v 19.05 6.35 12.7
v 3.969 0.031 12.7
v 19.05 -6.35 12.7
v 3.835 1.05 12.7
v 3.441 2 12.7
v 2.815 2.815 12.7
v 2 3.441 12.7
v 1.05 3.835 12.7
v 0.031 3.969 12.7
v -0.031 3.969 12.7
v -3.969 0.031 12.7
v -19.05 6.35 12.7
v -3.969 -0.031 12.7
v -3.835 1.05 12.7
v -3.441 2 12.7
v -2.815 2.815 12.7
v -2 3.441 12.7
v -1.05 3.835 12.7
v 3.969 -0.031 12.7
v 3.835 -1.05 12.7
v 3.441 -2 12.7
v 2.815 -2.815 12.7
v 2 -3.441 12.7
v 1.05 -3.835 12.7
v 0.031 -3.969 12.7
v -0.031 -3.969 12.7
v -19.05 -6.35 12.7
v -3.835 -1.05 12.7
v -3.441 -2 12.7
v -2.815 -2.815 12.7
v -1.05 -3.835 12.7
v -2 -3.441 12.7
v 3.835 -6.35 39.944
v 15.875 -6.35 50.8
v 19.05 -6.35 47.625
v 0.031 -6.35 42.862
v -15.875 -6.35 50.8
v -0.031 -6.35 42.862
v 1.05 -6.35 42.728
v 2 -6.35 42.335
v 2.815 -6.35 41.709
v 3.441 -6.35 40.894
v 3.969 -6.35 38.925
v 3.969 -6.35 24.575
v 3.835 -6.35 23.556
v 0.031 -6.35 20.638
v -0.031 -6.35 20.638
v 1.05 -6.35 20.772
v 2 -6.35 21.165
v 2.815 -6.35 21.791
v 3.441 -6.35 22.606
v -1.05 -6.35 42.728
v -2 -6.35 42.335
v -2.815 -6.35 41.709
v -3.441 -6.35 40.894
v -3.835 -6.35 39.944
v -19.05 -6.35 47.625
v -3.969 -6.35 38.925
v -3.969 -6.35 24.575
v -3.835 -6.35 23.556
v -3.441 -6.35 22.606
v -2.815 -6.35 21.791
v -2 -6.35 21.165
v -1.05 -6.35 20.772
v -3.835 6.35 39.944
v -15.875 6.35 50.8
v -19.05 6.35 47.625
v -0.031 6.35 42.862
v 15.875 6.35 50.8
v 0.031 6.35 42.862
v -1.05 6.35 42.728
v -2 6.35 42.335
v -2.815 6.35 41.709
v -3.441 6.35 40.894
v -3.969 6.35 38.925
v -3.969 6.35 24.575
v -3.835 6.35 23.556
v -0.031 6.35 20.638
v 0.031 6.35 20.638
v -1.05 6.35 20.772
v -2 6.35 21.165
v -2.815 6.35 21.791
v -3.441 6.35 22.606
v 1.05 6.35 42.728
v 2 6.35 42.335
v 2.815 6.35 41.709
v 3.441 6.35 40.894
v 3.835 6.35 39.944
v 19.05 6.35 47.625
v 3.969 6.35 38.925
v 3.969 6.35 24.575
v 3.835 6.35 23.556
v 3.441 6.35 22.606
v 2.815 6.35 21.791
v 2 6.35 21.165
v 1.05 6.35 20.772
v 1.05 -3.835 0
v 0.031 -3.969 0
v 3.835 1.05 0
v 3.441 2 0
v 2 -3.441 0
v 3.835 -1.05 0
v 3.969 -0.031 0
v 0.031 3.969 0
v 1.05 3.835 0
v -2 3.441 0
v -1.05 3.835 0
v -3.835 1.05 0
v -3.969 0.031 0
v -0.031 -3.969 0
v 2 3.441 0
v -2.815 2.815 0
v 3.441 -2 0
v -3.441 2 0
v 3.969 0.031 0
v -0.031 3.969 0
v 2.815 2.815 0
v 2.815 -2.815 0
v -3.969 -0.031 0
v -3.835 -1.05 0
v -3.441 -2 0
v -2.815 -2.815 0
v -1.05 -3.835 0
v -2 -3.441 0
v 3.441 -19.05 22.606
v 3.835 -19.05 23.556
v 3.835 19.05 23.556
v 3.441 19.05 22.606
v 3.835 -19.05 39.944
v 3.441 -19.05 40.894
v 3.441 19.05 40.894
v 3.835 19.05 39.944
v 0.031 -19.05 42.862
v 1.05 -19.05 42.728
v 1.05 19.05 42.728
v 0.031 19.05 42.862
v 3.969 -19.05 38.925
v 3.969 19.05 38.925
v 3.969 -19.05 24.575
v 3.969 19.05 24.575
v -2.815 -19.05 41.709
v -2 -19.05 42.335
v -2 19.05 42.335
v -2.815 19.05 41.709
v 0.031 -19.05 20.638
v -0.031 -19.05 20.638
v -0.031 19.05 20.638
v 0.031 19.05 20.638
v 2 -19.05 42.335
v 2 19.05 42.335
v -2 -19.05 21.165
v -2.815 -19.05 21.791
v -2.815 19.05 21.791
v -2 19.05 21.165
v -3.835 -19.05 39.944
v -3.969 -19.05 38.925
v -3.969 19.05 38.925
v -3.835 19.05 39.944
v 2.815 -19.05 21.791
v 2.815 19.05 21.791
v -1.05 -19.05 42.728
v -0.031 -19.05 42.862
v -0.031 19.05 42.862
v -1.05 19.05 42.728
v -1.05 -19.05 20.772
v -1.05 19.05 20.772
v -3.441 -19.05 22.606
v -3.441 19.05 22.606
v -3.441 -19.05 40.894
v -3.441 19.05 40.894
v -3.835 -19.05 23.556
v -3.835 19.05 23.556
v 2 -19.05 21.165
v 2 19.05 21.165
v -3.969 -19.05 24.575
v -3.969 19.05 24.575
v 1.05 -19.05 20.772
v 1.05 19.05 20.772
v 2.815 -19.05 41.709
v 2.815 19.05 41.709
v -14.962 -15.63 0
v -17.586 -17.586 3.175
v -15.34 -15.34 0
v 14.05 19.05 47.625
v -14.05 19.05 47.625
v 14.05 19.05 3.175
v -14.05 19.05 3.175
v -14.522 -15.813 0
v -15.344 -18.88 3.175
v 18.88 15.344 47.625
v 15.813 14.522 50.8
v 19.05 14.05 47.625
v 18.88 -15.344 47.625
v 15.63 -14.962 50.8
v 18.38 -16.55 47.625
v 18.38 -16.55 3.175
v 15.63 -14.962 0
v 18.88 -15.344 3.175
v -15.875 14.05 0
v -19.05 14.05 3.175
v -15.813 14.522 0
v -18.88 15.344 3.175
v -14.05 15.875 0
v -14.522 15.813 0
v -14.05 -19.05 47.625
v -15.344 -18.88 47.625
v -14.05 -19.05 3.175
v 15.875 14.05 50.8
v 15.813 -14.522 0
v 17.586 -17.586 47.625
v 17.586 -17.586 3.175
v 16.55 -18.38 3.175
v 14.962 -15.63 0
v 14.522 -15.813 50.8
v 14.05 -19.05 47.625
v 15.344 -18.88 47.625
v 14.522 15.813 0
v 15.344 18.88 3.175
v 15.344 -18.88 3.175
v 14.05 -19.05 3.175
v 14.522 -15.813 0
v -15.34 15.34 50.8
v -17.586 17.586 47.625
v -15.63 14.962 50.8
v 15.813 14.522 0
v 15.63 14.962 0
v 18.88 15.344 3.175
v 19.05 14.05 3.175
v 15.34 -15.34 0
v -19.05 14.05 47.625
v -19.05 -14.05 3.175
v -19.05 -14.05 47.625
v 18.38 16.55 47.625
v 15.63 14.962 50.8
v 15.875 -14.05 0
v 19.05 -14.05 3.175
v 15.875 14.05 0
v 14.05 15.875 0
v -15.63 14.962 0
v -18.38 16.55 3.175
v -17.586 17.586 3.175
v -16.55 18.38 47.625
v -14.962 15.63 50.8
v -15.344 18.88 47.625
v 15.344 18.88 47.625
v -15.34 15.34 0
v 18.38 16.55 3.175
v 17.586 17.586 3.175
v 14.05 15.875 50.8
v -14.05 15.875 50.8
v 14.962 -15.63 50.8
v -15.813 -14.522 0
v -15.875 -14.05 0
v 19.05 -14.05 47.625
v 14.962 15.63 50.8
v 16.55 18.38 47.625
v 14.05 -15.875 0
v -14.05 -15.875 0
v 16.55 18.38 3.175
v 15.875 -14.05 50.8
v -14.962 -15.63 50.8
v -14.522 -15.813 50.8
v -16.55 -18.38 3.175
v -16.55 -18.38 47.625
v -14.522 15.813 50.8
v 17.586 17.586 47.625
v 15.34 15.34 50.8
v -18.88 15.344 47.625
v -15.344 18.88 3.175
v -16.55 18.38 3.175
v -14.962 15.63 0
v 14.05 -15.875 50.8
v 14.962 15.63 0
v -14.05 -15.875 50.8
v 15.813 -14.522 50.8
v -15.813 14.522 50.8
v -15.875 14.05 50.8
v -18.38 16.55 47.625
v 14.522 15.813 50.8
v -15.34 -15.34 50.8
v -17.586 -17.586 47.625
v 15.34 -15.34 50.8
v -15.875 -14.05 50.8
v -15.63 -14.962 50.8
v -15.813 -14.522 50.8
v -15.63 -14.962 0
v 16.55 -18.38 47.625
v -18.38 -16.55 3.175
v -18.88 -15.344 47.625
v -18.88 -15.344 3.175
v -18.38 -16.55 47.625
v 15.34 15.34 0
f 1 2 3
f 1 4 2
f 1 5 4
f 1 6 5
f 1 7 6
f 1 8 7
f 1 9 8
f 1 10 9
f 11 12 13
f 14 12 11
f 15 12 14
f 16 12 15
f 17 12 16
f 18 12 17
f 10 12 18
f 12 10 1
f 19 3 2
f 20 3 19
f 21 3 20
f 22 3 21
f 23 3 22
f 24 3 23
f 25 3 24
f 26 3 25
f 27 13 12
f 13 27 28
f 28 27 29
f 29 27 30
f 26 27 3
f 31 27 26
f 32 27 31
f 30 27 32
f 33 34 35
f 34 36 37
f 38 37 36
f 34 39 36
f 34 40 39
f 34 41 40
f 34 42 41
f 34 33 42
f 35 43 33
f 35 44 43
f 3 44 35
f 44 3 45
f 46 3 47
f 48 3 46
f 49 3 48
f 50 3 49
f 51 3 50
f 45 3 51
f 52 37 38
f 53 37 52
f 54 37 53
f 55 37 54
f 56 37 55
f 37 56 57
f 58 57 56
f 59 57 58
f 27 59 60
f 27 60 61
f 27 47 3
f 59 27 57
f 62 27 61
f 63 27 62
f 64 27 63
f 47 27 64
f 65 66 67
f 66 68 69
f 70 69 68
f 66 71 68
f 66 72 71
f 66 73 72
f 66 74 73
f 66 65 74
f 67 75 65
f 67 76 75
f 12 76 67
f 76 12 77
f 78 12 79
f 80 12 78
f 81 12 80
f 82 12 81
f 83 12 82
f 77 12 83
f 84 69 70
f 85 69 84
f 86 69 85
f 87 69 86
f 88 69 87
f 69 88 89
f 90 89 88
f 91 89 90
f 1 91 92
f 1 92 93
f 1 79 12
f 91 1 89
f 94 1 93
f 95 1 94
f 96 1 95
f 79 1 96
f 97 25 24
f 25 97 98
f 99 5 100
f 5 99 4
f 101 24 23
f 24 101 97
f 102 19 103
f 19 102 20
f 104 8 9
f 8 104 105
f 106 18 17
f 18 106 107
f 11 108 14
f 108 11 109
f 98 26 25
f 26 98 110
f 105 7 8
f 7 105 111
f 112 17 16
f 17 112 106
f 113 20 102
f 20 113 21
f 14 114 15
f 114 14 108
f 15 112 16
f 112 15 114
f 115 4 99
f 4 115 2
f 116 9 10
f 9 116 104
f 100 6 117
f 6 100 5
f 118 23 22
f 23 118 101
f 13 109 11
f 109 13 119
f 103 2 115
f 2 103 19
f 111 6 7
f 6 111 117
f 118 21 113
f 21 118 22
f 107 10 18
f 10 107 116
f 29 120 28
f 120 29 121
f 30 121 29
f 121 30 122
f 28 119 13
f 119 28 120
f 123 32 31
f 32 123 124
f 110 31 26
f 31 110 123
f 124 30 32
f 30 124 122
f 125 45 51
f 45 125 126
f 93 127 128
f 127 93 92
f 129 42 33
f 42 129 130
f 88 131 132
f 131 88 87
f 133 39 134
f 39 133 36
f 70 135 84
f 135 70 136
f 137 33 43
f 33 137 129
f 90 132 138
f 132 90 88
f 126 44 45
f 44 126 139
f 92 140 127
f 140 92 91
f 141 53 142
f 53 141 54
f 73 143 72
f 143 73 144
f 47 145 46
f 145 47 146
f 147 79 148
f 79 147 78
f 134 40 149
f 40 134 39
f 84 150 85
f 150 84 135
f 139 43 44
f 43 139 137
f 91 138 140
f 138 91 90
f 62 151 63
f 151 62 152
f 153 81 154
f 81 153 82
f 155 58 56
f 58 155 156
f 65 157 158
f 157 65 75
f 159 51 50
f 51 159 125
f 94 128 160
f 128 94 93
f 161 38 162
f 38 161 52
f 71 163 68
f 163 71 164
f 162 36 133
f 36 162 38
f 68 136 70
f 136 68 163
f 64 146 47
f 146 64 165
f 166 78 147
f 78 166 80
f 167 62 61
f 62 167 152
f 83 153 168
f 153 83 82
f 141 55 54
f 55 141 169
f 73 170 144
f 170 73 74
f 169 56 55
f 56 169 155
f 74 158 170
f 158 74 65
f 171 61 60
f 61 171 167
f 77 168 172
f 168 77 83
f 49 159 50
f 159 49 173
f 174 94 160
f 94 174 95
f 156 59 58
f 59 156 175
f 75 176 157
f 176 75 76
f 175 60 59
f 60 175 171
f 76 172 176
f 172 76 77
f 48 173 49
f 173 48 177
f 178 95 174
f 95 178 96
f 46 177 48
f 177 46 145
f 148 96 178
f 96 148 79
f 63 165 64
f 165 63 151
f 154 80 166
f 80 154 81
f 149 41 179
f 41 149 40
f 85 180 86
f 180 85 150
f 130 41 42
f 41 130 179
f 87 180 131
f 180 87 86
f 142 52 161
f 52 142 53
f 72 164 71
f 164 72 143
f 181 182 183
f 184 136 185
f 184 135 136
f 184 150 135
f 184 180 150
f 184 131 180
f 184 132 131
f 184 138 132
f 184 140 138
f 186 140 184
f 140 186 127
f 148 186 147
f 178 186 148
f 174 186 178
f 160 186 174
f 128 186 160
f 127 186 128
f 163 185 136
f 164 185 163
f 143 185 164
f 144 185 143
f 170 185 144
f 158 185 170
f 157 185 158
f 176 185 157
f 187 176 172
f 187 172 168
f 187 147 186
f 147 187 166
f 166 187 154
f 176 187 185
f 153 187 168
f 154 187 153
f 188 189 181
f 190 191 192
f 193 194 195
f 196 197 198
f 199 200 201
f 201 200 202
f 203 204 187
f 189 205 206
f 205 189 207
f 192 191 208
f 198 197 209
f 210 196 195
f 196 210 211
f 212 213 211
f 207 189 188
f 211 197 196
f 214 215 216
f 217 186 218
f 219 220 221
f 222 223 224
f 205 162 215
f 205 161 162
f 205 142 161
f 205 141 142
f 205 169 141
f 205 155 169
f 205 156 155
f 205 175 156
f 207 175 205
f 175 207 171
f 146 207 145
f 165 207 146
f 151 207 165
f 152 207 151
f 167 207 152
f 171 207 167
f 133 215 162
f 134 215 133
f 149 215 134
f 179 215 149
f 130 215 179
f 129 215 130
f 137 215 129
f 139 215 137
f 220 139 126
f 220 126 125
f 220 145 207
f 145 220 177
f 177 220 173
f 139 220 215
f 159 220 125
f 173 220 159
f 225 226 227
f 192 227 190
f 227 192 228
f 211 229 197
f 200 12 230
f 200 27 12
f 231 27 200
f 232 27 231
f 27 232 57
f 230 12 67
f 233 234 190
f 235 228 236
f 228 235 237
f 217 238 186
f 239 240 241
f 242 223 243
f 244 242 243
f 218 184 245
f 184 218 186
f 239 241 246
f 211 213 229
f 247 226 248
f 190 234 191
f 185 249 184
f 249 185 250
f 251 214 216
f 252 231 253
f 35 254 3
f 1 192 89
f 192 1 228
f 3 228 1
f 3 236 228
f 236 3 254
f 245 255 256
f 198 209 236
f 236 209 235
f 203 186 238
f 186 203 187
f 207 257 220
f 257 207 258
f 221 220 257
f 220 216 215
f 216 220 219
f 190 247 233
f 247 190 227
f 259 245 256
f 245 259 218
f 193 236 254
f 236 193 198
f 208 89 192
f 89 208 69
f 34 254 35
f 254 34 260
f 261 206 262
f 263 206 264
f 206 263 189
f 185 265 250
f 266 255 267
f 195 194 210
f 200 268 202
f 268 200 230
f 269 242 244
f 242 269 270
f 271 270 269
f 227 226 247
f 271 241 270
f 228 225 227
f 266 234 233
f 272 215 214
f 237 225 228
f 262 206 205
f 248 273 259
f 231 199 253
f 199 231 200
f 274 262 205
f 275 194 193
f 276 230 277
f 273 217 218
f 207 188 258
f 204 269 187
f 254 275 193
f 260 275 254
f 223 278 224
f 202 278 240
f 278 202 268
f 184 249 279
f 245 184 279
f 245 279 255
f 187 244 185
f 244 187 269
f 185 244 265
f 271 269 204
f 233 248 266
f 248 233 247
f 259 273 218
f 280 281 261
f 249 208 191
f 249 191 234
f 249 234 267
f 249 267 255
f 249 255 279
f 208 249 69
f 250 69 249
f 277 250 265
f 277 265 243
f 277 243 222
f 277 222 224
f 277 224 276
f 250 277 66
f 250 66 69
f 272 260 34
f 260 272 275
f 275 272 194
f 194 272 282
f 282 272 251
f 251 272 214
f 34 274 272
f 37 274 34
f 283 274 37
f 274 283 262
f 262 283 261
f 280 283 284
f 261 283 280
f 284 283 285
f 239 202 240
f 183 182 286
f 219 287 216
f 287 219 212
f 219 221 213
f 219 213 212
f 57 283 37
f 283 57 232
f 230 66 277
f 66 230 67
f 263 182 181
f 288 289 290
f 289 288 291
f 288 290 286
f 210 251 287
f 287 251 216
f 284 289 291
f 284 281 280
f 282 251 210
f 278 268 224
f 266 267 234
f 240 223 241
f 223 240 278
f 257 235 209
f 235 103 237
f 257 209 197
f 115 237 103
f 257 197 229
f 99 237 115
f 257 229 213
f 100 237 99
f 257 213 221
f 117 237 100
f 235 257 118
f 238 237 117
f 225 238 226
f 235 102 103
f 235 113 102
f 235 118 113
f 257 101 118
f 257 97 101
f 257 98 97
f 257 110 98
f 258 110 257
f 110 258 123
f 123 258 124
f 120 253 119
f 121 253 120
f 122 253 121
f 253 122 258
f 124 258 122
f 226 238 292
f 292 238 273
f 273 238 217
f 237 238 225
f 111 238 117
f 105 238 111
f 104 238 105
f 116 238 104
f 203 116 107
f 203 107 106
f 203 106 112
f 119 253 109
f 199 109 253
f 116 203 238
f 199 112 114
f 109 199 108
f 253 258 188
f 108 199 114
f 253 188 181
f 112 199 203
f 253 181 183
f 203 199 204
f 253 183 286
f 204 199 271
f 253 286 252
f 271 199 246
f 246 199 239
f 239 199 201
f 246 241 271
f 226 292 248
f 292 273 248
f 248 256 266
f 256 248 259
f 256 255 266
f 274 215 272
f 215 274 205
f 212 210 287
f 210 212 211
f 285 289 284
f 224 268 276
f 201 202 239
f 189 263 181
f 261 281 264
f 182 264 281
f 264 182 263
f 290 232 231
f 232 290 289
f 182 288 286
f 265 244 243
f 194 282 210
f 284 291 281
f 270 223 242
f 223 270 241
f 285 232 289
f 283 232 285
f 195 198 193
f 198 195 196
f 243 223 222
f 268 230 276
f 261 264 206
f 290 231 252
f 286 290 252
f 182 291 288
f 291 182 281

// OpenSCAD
// file: ../lib/TOGUnitTable-v1.scad
// TOGUnitTable-v1.1.0 - Library for handling 'complex amounts' in the form of [multiplier, unit name], e.g. [1.5, "inch"]
//
// 2023-07-01: the following 'annotation' is something I just made up,
// but is intended as a way for future packaging tools to know that it's 'safe'
// (because everything has been somewhat namespaced) to turn a `use <x>`
// into an `include <x>`, making it inlinable:
// safe-to-include: true
// 
// Versions:
// v1.0.0:
// - Created it.
// v1.1.0:
// - Add optional 'dbgctxstr' parameter to unit decoding functions, for better error messages
// 
// Naming convention:
// Doing 'OO without classes', here.
// Fully qualified name = class or package name + "__" + member name
// Class or package name may itself be namespaced, and class names may double as package names.
// Here, tog_unittable names both a class and a package.

// Demo unit table uses 'micrometer' as the base unit
// in order to keep multipliers as integers as much as possible.
tog_unittable__demo_unit_table = [
	["um",    [    1   ,   "um"], "micrometer" ],
	["mm",    [ 1000   ,   "um"], "millimeter" ],
	["inch",  [25400   ,   "um"], "inch"       ],
	["u",     [    1/16, "inch"], "model unit" ], // As used by TGx9 et al
	["atom",  [    8   ,    "u"], "model atom" ],
	["chunk", [    3   , "atom"], "model chunk"],
];

use <./DbgCtxStrLib1.scad>

function tog_unittable__list__filter(list, predicate) = [
	for( item=list ) if( predicate(item) ) item
];
function tog_unittable__list__first(list, on_error) =
	len(list) > 0 ? list[0] : on_error();

function tog_unittable__unit_value_ca(unit_table, unit_name, dbgctxstr=undef) =
	tog_unittable__list__first(
		tog_unittable__list__filter(unit_table, function (entry) entry[0] == unit_name),
		function () assert(false,
			str("Did not find entry for unit '", unit_name, "' in unit table", dbgctxstr_errmsg_suffix(dbgctxstr))
		)
	)[1];

function tog_unittable__ca__is_valid( ca ) =
	is_list(ca) && len(ca) == 2;

// Break down 'amount' until it is in a base unit (one which is defined in terms of itself)
function tog_unittable__simplify_ca(unit_table, amount, dbgctxstr=undef) =
	assert( tog_unittable__ca__is_valid(amount), str(amount, " is not a valid Complex Amount (should be [numeric_value, \"unit_name\"])", dbgctxstr=dbgctxstr) )
	let( unit_value_ca = tog_unittable__unit_value_ca(unit_table, amount[1], dbgctxstr=dbgctxstr) )
	unit_value_ca[1] == amount[1] ? amount :
		tog_unittable__simplify_ca(unit_table, [amount[0] * unit_value_ca[0], unit_value_ca[1]]);

function tog_unittable__divide_ca(unit_table, numerator, denominator, dbgctxstr=undef) =
	let(
		numerator_base_ca   = tog_unittable__simplify_ca(unit_table, numerator, dbgctxstr=dbgctxstr),
		denominator_base_ca = tog_unittable__simplify_ca(unit_table, denominator, dbgctxstr=dbgctxstr)
	)
	assert(numerator_base_ca[1] == denominator_base_ca[1], str("Different base units found for ", numerator[1], " and ", denominator[1]))
	numerator_base_ca[0] / denominator_base_ca[0];	

assert(tog_unittable__divide_ca(tog_unittable__demo_unit_table, [1,   "mm"], [  1, "mm"]) ==     1   );
assert(tog_unittable__divide_ca(tog_unittable__demo_unit_table, [1,   "mm"], [  1, "um"]) ==  1000   );
assert(tog_unittable__divide_ca(tog_unittable__demo_unit_table, [1, "inch"], [  1, "um"]) == 25400   );
assert(tog_unittable__divide_ca(tog_unittable__demo_unit_table, [1, "inch"], [  1, "mm"]) ==    25.4 );
assert(tog_unittable__divide_ca(tog_unittable__demo_unit_table, [1, "inch"], [254, "um"]) ==   100   );
assert(tog_unittable__divide_ca(tog_unittable__demo_unit_table, [1,    "u"], [  1, "um"]) ==  1587.5 );
// file: ../lib/TOGStringLib1.scad
// TOGStringLib1.7
// 
// Functions for parsing quantities
// and other misc. string handling.
// 
// v1.5
// - togstr1_parse_quantity will treat unit-only strings as meaning 1/1 of that unit.
//   e.g. togstr1_parse_quantity("foot") = [[[1,1], "foot", 4]]
// v1.6:
// - togstr1_parse_quantity allows unit name to be omitted when quantity is zero and $togunits1_default_unit is defined
// v1.7:
// - Add optional 'dbgctxstr' parameter to unit decoding functions, for better error messages
// 
// Globals: $togunits1_default_unit - affects what 'unit' is returned
// when interpreting numbers or strings that lack the unit.


function togstr1__todo(message) = assert(false, str("TODO: ", message));

module togstr1__assert_eq(a, b) {
	if( a != b ) {
		assert( a == b, str(a, " != ", b) );
	}
}



function togstr1_slice(source, i0, i1) =
	i0 == i1 ? "" :
	str(source[i0], togstr1_slice(source, i0+1, i1));

function togstr1_tokenize(source, sep, maxcount=9999, i=0, tokenstart=0) =
	len(source) == i ? (
		(tokenstart < i) ? [togstr1_slice(source, tokenstart, i)] : []
	) :
	source[i] == sep ? (
		(tokenstart < i) ? concat([togstr1_slice(source, tokenstart, i)], togstr1_tokenize(source, sep, maxcount-1, i+1, i+1)) :
		togstr1_tokenize(source, sep, maxcount, i+1, i+1)
	) :
	maxcount <= 1 ? [togstr1_slice(source, tokenstart, len(source))] :
	togstr1_tokenize(source, sep, maxcount, i+1, tokenstart);

togstr1__assert_eq( ["foo","bar","baz"], togstr1_tokenize("foo-bar-baz", "-") );
// Duplicate delimiters are ignored
togstr1__assert_eq( ["foo","bar","baz"], togstr1_tokenize("foo--bar--baz", "-") );
// Trailing delimiters are ignored
togstr1__assert_eq( ["foo","bar","baz"], togstr1_tokenize("foo--bar--baz--", "-") );
// Leading delimiters are ignored
togstr1__assert_eq( ["foo","bar","baz"], togstr1_tokenize("--foo--bar--baz", "-") );
// Can limit number of tokens returned
togstr1__assert_eq( ["foo","bar-baz"], togstr1_tokenize("foo-bar-baz", "-", 2) );
togstr1__assert_eq( ["foo","bar-baz"], togstr1_tokenize("--foo--bar-baz", "-", 2) );
togstr1__assert_eq( ["foo","bar--baz"], togstr1_tokenize("--foo--bar--baz", "-", 2) );
togstr1__assert_eq( ["foo"], togstr1_tokenize("--foo--", "-", 2) );




/** \d+ -> [num, end_index] */
function togstr1_parse_decimal_nat(str, index=0, current=0, dbgctxstr=undef) =
	len(str) == index ? [current, index] :
	let( dig = ord(str[index]) - ord("0") )
	(dig >= 0 && dig <= 9) ? togstr1_parse_decimal_nat(str, index+1, current*10 + dig, dbgctxstr=dbgctxstr) :
	[current, index];

togstr1__assert_eq( [123,3], togstr1_parse_decimal_nat("123") );
togstr1__assert_eq( [123,3], togstr1_parse_decimal_nat("123.45") );

/** [+-]*\d+ ->  [[num, den], end_index] */
function togstr1_parse_decimal_number(str, index=0, dbgctxstr=undef) =
	str[index] == "+" ? togstr1_parse_decimal_number(str, index+1) :
	str[index] == "-" ? let(r=togstr1_parse_decimal_number(str, index+1)) [[-r[0][0], r[0][1]], r[1]] :
	let(r = togstr1_parse_decimal_nat(str, index, dbgctxstr=dbgctxstr))
	str[r[1]] != "." ? [[r[0], 1], r[1]] :
	let(fracr = togstr1_parse_decimal_nat(str, r[1]+1))
	let(mult = pow(10, fracr[1]-(r[1]+1)))
	[[r[0]*mult + fracr[0], mult], fracr[1]];

togstr1__assert_eq( [[   36,   1], 2], togstr1_parse_decimal_number( "36"   ) );
togstr1__assert_eq( [[ 3524, 100], 5], togstr1_parse_decimal_number( "35.24") );
togstr1__assert_eq( [[-3524, 100], 6], togstr1_parse_decimal_number("-35.24") );
togstr1__assert_eq( [[    0,   1], 0], togstr1_parse_decimal_number( "NotANumber") );

function togstr1__gcd(a, b) = b == 0 ? abs(a) : togstr1__gcd(b, a % b);

togstr1__assert_eq(10, togstr1__gcd(10, 20));
togstr1__assert_eq( 5, togstr1__gcd(10, 15));
togstr1__assert_eq( 2, togstr1__gcd(10, 14));


function togstr1__normalize_rat(rat) =
	let(gcd = togstr1__gcd(rat[0], rat[1]))
	// TODO: find LCD, divide top and bottom by it
	rat[0] < 0 && rat[1] < 0 ? [-rat[0]/gcd, -rat[1]/gcd] :
	[rat[0]/gcd, rat[1]/gcd];

/** <decnum>[/<decnum>] -> [[num, den], end_index] */
function togstr1__multiply_rat(a, b) =
	togstr1__normalize_rat(
		a[1] == b[1] ? [a[0]*b[0]/a[1], a[1]] : // TODO: LCD instead of special case
		[a[0]*b[0], a[1]*b[1]]
	);
function togstr1__divide_rat(a, b) = togstr1__normalize_rat([a[0]*b[1], a[1]*b[0]]);


function togstr1__add_rat(a, b) =
	togstr1__normalize_rat([a[0]*b[1] + b[0]*a[1], a[1]*b[1]]);
	
togstr1__assert_eq([1, 2], togstr1__add_rat([1, 3], [1, 6]));


/** Return [[num, den], end_index] */
function togstr1_parse_rational_number(str, index=0, dbgctxstr=undef) =
	let( numr = togstr1_parse_decimal_number(str, index, dbgctxstr=dbgctxstr) )
	str[numr[1]] == "+" ?
		let(numrb = togstr1_parse_rational_number(str, numr[1]+1, dbgctxstr=dbgctxstr))
		[togstr1__add_rat(numr[0], numrb[0]), numrb[1]]	:
	str[numr[1]] == "/" ?
		let( denr = togstr1_parse_decimal_number(str, numr[1]+1, dbgctxstr=dbgctxstr) )
		[togstr1__divide_rat(numr[0], denr[0]), denr[1]] :
	numr;

togstr1__assert_eq( [[   123,  1],3], togstr1_parse_rational_number( "123") );
togstr1__assert_eq( [[   123,  1],4], togstr1_parse_rational_number("+123") );
togstr1__assert_eq( [[-  123,  1],4], togstr1_parse_rational_number("-123") );
togstr1__assert_eq( [[   123,  1],6], togstr1_parse_rational_number("-+-123") );
togstr1__assert_eq( [[ 12345,100],6], togstr1_parse_rational_number("123.45") );
togstr1__assert_eq( [[  2469, 40],8], togstr1_parse_rational_number("123.45/2") );
togstr1__assert_eq( [[-  823,160],10], togstr1_parse_rational_number("-123.45/24") );
togstr1__assert_eq( [[     4,  3],5], togstr1_parse_rational_number( "1+1/3") );
togstr1__assert_eq( [[     0,  1],0], togstr1_parse_rational_number( "NotANumber!!") );


/** Return [[[num, den], unit], end_index] */
function togstr1_parse_quantity(str, dbgctxstr=undef) =
	let( numr = togstr1_parse_rational_number(str, dbgctxstr=dbgctxstr) )
	// For now, just let the unit be the rest of the string;
	// can revisit to stop at delimiters if needed in the future.
	numr[1] > 0 && numr[1] == len(str) && numr[0][0] == 0 && !is_undef($togunits1_default_unit) ? [[[0,1], $togunits1_default_unit], numr[1]] :
	assert( numr[1] < len(str), str("Quantity string missing unit: '", str, "'; note that '0' is acceptable if $togunits1_default_unit is defined"))
	let( unit = togstr1_slice(str, numr[1], len(str)) )
	let( quant = numr[1] > 0 ? numr[0] : [1,1] ) // No number = 1 (possibly this should be an error instead)
	[[quant, unit], len(str)];

togstr1__assert_eq( [[[  3,  1], "acre"],  5], togstr1_parse_quantity("3acre") );
togstr1__assert_eq( [[[  3,  5], "acre"],  7], togstr1_parse_quantity("3/5acre") );
togstr1__assert_eq( [[[301,500], "acre"], 10], togstr1_parse_quantity("3.01/5acre") );
togstr1__assert_eq( [[[  1,  1], "acre"],  4], togstr1_parse_quantity("acre") ); // Should either treat as one or throw an error!
togstr1__assert_eq( [[[  0,  1],"hectare"],1], togstr1_parse_quantity("0", $togunits1_default_unit="hectare") ); // Zero is fine if $togunits1_default_unit is defined
// file: ../lib/TOGridLib3.scad
// TOGridPileLib-v3.4
// 
// HOKAY WHAT ARE THE COMMON
// things that I want the library to do?
// 
// - [X] Be `include`-able, to make inlining easy
// - [X] Allow unit table to be overridden easily, but default by default
// - [ ] Support common configurations by name (e.g. "V9", or some "WSTYPE-...")
//   without having to pass 50 different parameters in
// - [ ] Support subtractions for those common configurations also,
//   such that you don't need to remember to 'do less rounding', etc.
// - [ ] Make a simple foot-only block that I can subtract stuff from
//   params: foot style
// - [ ] Make a block with a lip
// - [ ] Make a block foot, and I'll intersect it with some other things
// - [X] Translate a block_size_ca to mm
// 
// Changes:
// v3.1:
// - s/togridpile3_decode_size/togridpile3_decode_vector/
// v3.2:
// - togridpile3_decode(num) = num
// v3.3:
// - Change prefix from `togridpile3` to `togridlib3`
// v3.4:
// - Add optional 'dbgctxstr' parameter to unit decoding functions, for better error messages

use <../lib/TOGUnitTable-v1.scad>

function togridlib3_map(arr, fn) = [ for(item=arr) fn(item) ];

togridlib3_default_unit_table = [
	["um",    [    1,               "um"]],
	["mm",    [ 1000,               "um"]],
	["inch",  [25400,               "um"]],
	["u",     [    1.5875,          "mm"]],
	["atom",  [    8,                "u"]],
	["chunk", [    3,             "atom"]],
	["tgp-standard-bevel"   , [2,    "u"]], // Usuually 1/8"
	["m-outer-corner-radius", [4,    "u"]],
	["f-outer-corner-radius", [3,    "u"]],
];

function togridlib3_get_default_unit_table() = togridlib3_default_unit_table;
function togridlib3_get_unit_table() = is_undef($togridlib3_unit_table) ? togridlib3_default_unit_table : $togridlib3_unit_table;

function togridlib3_decode(dim, unit=[1, "mm"], unit_table=togridlib3_get_unit_table(), dbgctxstr=undef) =
	is_num(dim) ? dim : tog_unittable__divide_ca(unit_table, dim, unit, dbgctxstr=dbgctxstr);
function togridlib3_decode_vector(size, unit=[1, "mm"], unit_table=togridlib3_get_unit_table(), dbgctxstr=undef) =
	togridlib3_map(size, function(dim) is_num(dim) ? dim : tog_unittable__divide_ca(unit_table, dim, unit, dbgctxstr=dbgctxstr));

module togridlib3_cube(size, offset=0) {
	cube(togridlib3_decode_vector(size), center=true);
}
// file: ../lib/DbgCtxStrLib1.scad
// DbgCtxStrLib1.0
// 
// Library for dealing with 'debug context strings' (usually 'dbgctxstr').

function dbgctxstr_errmsg_suffix(dbgctxstr) =
	is_undef(dbgctxstr) || dbgctxstr == "" ? "" :
	str(" (", dbgctxstr, ")");
// file: ../lib/TOGArrayLib1.scad
// TOGArrayLib1.5
// 
// Functions for working with arrays.
// 
// v1.1:
// - tal1_reduce assert(is_list(items)) to prevent infinite recursion
//   when given undefined or other non-list values
// v1.1.1:
// - Fix tal1_uniq_remap_v2 to return "list-remap-result" as the
//   first element of the returned list
// v1.2:
// - Add tal1_replace_at function
// v1.3:
// - tal1_is_vec_of, tal1_is_vec_of_num
// v1.4:
// - tal1_assert_for_each, for when you want to assert something
//   about each of a list of items and get nice failure messages
// v1.5:
// - Add tal1_duplicate_reversed function, which may be
//   handy when generating symmetrical polygons and stuff.

/**
 * Make a list with the contents of list `a`,
 * but starting at offset `off`, replaced by the contents of list `b`.
 * len(result) = max(len(a), off+len(b))
 */
function tal1_replace_at(a, off, b, default_value=undef, default_value_function=undef) =
	assert(is_list(a))
	assert(is_list(b))
	let( _dvf = !is_undef(default_value_function) ? default_value_function : function(i) default_value )
[
	for( i=[0:1:min(off,len(a))-1] ) a[i],
	for( i=[len(a):1:off-1] ) _dvf(i),
	for( i=[off:1:off+len(b)-1] ) b[i-off],
	for( i=[off+len(b):1:len(a)-1] ) a[i],
];

// Simplest case
assert([] == tal1_replace_at([], 0, []));
// Second simplest cases
assert(["foo"] == tal1_replace_at(["foo"], 0, []));
assert(["foo"] == tal1_replace_at([], 0, ["foo"]));
// Replace one item
assert(["foo","quux","baz"] == tal1_replace_at(["foo","bar","baz"], 1, ["quux"]));
// Replace and extend
assert(["foo","quux","tuna","tina"] == tal1_replace_at(["foo","bar","baz"], 1, ["quux", "tuna", "tina"]));
// Add beyond end of `a`
assert(["foo","zzz","quux"] == tal1_replace_at(["foo"], 2, ["quux"], default_value="zzz"));
// Adding 'nothing' should still fill to that point with defaults
assert(["foo","zzz","zzz"] == tal1_replace_at(["foo"], 3, [], default_value="zzz"));


function tal1_reduce(start, items, func, offset=0) =
	assert(is_list(items))
	len(items) == offset ? start :
	tal1_reduce(func(start, items[offset]), items, func, offset+1);

function tal1_consecutive_duplicate_count(items) = tal1_reduce(
	[0, undef],
	items,
	function(z,item) [z[0] + (item == z[1] ? 1 : 0), item]
)[0];

assert(0 == tal1_consecutive_duplicate_count([]));
assert(0 == tal1_consecutive_duplicate_count([50]));
assert(1 == tal1_consecutive_duplicate_count([50,50]));
assert(0 == tal1_consecutive_duplicate_count([50,51,52,53]));
assert(1 == tal1_consecutive_duplicate_count([50,51,52,52]));
assert(3 == tal1_consecutive_duplicate_count([50,50,50,50]));

// Set test_size to arbirarily large values
// to ensure that OpenSCAD can handle heavy recursion
let(test_size=1000) assert(test_size/2 == tal1_consecutive_duplicate_count([for(i=[0:1:test_size-1]) floor(i/2)]));



function tal1_uniq_(items, off0, off1) =
	let(chunklen = off1-off0)
	chunklen == 0 ? [] :
	chunklen == 1 ? [items[off0]] :
	let(half=floor(chunklen/2))
	let(left  = tal1_uniq_(items, off0     , off0+half))
	let(right = tal1_uniq_(items, off0+half, off1     ))
	assert(len(left) > 0)
	assert(len(right) > 0)
	left[len(left)-1] == right[0] ? [each left, for(i=[1:1:len(right)-1]) right[i]] :
	[each left, each right];

/** Given a list of items, returns a new list with identical consecutive items merged */
function tal1_uniq(items) = tal1_uniq_(items, 0, len(items));

assert([] == tal1_uniq([]));
assert([123] == tal1_uniq([123]));
assert([55,0,1,2,3] == tal1_uniq([55,0,1,2,3]));
assert([55,0,1,2] == tal1_uniq([55,0,1,1,2]));
assert([55,0,1] == tal1_uniq([55,55,0,0,0,0,0,0,1,1,1,1]));
assert([55,0] == tal1_uniq([55,0,0,0,0,0,0,0]));



/**
 * Returns [new items, old index -> new index mapping].
 * No-op version.
 */
function tal1_uniq_remap_v1(items) =
	["list-remap-result", items, [for (vi=[0:1:len(items)-1]) vi]];

// [a, a, b, b, c, c]
//
// [a,    ...], []  -> [a],[0]
// [a, a, ...], [0] -> [a],[0,0]

assert([1,2,3] == [1,2,3]);

/**
 * Recursive version that will combine adjacent identical vertexes,
 * but will use the original items.
 */
function tal1_uniq_remap_v2(items, map=[]) =
	let(index = len(map))
	len(items) == index ? ["list-remap-result", items, map] :
	index == 0 ? tal1_uniq_remap_v2(items, [0]) :
	items[index] == items[map[index-1]] ? tal1_uniq_remap_v2(items, [for(vi=map) vi, map[index-1]]) :
	tal1_uniq_remap_v2(items, [for(vi=map) vi, index]);

assert(tal1_uniq_remap_v2([1,1,2,2,3,4]) == ["list-remap-result", [1,1,2,2,3,4], [0,0,2,2,4,5]]);


/**
 * Returns true if `vec` is a list of at least min_len items
 * and component_check(each item, even those beyond min_len) is true.
 */
function tal1_is_vec_of(vec, min_len=0, component_check=function(x) true) =
	assert(is_num(min_len) && min_len >= 0)
	assert(is_function(component_check))
	is_list(vec) && len(vec) >= min_len &&
	tal1_reduce(true, vec, function(prev,item) prev && component_check(item));

function tal1_is_vec_of_num(vec, min_len=0) = tal1_is_vec_of(vec, min_len, function(i) is_num(i));

assert( true == tal1_is_vec_of_num([1,2,3]));
assert( true == tal1_is_vec_of_num([]));
assert( true == tal1_is_vec_of_num([1,2,3], 3));
assert(false == tal1_is_vec_of_num([1,2], 3));
assert(false == tal1_is_vec_of_num([1,2,"spoon"], 3));
// Requirements are ambiguous when
// first min_len items are numbers, but there are non-numeric items afterwards,
// so let's error on the side of saying 'no, it's not a list of numbers';
// i.e. the item check and the min_len are independent.
assert(false == tal1_is_vec_of_num([1,2,3,"artichoke"], 3));


/**
 * Asserts that item_checker(each item in list, index of item)[0] is true.
 * Second element of item_checker return value is assertion message.
 * Returns the original list, in case that's useful to you.
 */
function tal1_assert_for_each(list, item_checker) =
	let( _ignored = [ for(i=[0:1:len(list)-1])
		let(q=item_checker(list[i],i))
		let(passed=is_bool(q) ? q : is_list(q) ? q[0] : assert(false, str(
			"tal1_assert_for_each: item_checker should return Bool|[Bool,String], but returned ",
			q, " for item at index ", i)))
		let(message=is_list(q) ? q[1] : undef)
		assert(passed, message)
		q
	])
	list;

// Callback can return a boolean...
assert([1,2,3] == tal1_assert_for_each([1,2,3], function(v,i) is_num(v)));
// ...or a [boolean, string]
assert([1,2,3] == tal1_assert_for_each([1,2,3], function(v,i) [is_num(v), "element be a num"]));

// [a, b, c] -> [a, b, c, rxf(c), rxf(b), rxf(a)]
function tal1_duplicate_reversed(list, rxf=function(item) item) =
	[
		each list,
		for( i=[len(list)-1 : -1 : 0] ) rxf(list[i]),
	];
// file: ../lib/TOGUnits1.scad
// TOGUnits1.7
// 
// For simlifying quantity parsing and unit conversion
// 
// v1.1:
// - Add `togunits1_decode` function
// v1.2:
// - Add togunits1_decode_vec
// v1.3:
// - Add togunits1_vec_to_cas
// v1.4:
// - Add togunits1_vec_to_mms
// v1.5:
// - Remove unused `unit` parameter from `togunits1_vec_to_cas`
// v1.6:
// - togunits1_decode accepts `xf` parameter, same as togunits1_decode_vec
// v1.7:
// - Add optional 'dbgctxstr' parameter to unit decoding functions, for better error messages
// 
// Reserved but not-yet-actually-used globals:
// - $togunits1_default_unit - default unit when interpreting "0"
//   - See TOGStringLib1
// - $togunits1_default_implied_unit - when interpreting quantities without unit, assume they have this one
//   - This might be a bad idea, so never implemented!

use <./DbgCtxStrLib1.scad>
use <./TOGridLib3.scad>
use <./TOGStringLib1.scad>

function togunits1__is_ca(what) =
	is_list(what) && len(what) == 2 && is_num(what[0]) && is_string(what[1]);

function togunits1__parse_to_ca(what, dbgctxstr=undef) =
	assert( is_string(what) )
	let( parseresult = togstr1_parse_quantity(what, dbgctxstr) )
	assert( parseresult[1] > 0, str("Failed to parse quantity from  ", what, dbgctxstr=dbgctxstr) )
	let( parsed = parseresult[0] )
	let( rat = parsed[0] )
	let( unit = parsed[1] )
	[rat[0]/rat[1], unit];

function togunits1_to_ca(what, dbgctxstr=undef) =
	is_string(what) ? togunits1__parse_to_ca(what, dbgctxstr=dbgctxstr) :
	togunits1__is_ca(what) ? what :
	is_num(what) ? [what, "mm"] :
	assert(false, str("Unrecognized quantity representation: ", what));

function togunits1_vec_to_cas(whats) =
	[for(w=whats) togunits1_to_ca(w)];

function togunits1__get_transform(name) =
	is_function(name) ? name :
	is_undef(name) ? function(n) n :
	name == "round" ? function(n) round(n) :
	name == "ceil" ? function(n) ceil(n) :
	assert(false, str("Unrecognized transform: '", name, "'"));

function togunits1_decode(what, unit=[1,"mm"], xf=undef, dbgctxstr=undef) =
	let( ca = togunits1_to_ca(what, dbgctxstr=dbgctxstr) )
	let( xf1 = togunits1__get_transform(xf) )
	xf1(togridlib3_decode(ca, unit=togunits1_to_ca(unit), dbgctxstr=dbgctxstr));

function togunits1_decode_vec(whats, unit=[1,"mm"], xf=undef) =
	let( unit_ca = togunits1_to_ca(unit) )
	let( xf1 = togunits1__get_transform(xf) )
	[for(w=whats) xf1(togunits1_decode(w, unit_ca))];

function togunits1_to_mm(what, dbgctxstr=undef) = togunits1_decode(what, [1,"mm"], dbgctxstr=dbgctxstr);
function togunits1_vec_to_mms(what) = togunits1_decode_vec(what, [1,"mm"]);
// file: ../lib/TOGMod1Constructors.scad
// TOGMod1Constructors-v1.11
// 
// Functions to construct objects understood by TOGMod1
// 
// v1.1:
// - Add togmod1_make_rounded_rect
// v1.2:
// - togmod1_make_rounded_rect can make ovals
// v1.3:
// - togmod1_circle_points, to just get the points of a circle
// - if pos parameter to circle function has a third element,
//   returned vertexes will include it as the z component;
// v1.3.1
// - Some assertions
// v1.4:
// - Refactor togmod1_rounded_rect_points and togmod1_circle_points
//   to use togmod1__make_nd_vector_adder for adapting to whatever
//   `pos` parameter is.
// v1.5:
// - togmod_rounded_rect_points will not simplify completely rounded sides
//   (where length of side is exactly twice the rounding radius)
//   unless simplify_rounded_sides=true
//   - This makes it more useful for polyhedron generation,
//     where radius varies, but number of points must remain constant.
// v1.6:
// - togmod1_make_rect makes a simple rectangle
// - togmod1_make_rounded_rect will defer to togmod1_make_rect when r=0
// v1.7:
// - togmod1_make_circle will return empty shape (["union"]) when d=0
// v1.8:
// - Add togmod1_text
// v1.9:
// - togmod1_circle_points uses 3 as minimum circle point count instead of 6
// v1.10:
// - Fix togmod1_linear_extrude_y so that range corresponds to Y start/end and
//   polygon X,Y correspond to X,Z.  Previously it was rotated wrongly,
//   which would have gone unnoticed for symmetrical shapes centered at 0,0.
// v1.11:
// - Remove an 'echo'

use <./TOGArrayLib1.scad>

function togmod1__make_nd_vector_adder(origin=[0,0]) =
	let(origin_is_zero = tal1_reduce(true, origin, function(prev,item) prev && item == 0))
	origin_is_zero ? (function(vec) len(vec) >= len(origin) ? vec : tal1_replace_at(origin, 0, vec)) :
	function(vec) [
		for(i=[0:1:max(len(origin),len(vec))-1]) (len(vec) > i ? vec[i] : 0) + (len(origin) > i ? origin[i] : 0),
	];

assert([1,2,3] == togmod1__make_nd_vector_adder()([1,2,3]));
assert([1,2,3] == togmod1__make_nd_vector_adder([0,0,3])([1,2]));


function togmod1_make_cuboid(size) =
	assert(is_list(size))
	assert(len(size) >= 3)
	assert(is_num(size[0]))
	assert(is_num(size[1]))
	assert(is_num(size[2]))
	["polyhedron-vf", [
		[-size[0]/2, -size[1]/2, -size[2]/2],
		[+size[0]/2, -size[1]/2, -size[2]/2],
		[-size[0]/2, +size[1]/2, -size[2]/2],
		[+size[0]/2, +size[1]/2, -size[2]/2],
		[-size[0]/2, -size[1]/2, +size[2]/2],
		[+size[0]/2, -size[1]/2, +size[2]/2],
		[-size[0]/2, +size[1]/2, +size[2]/2],
		[+size[0]/2, +size[1]/2, +size[2]/2]
	], [
		[0,1,3,2],[0,4,5,1],[4,6,7,5],[3,7,6,2],[1,5,7,3],[6,4,0,2]
	]];

function togmod1_make_polygon(verts) =
	["polygon-vp", verts, [[for( i=[0:1:len(verts)-1] ) i%len(verts)]]];

function togmod1_rounded_rect_points(size, r, pos=[0,0], simplify_rounded_sides=false) =
	assert(is_list(size))
	assert(len(size) >= 2)
	let(radii = is_list(r) ? r : is_num(r) ? [r,r] : assert(false, "rounded_rect r(adius) should be list<num> or num"))
	let(rx = radii[0])
	let(ry = radii[1])
	assert(is_num(rx))
	assert(is_num(ry))
	assert(size[0] >= 2*rx, str("size[0] must be >= 2*r[0]; size[0] = ",size[0],", 2*r[0] = ",2*rx))
	assert(size[1] >= 2*ry, str("size[1] must be >= 2*r[1]; size[1] = ",size[1],", 2*r[1] = ",2*ry))
	let(quarterfn=max($fn/4, 1))
	let(qfnx = simplify_rounded_sides && size[0] == 2*rx ? quarterfn-1 : quarterfn)
	let(qfny = simplify_rounded_sides && size[1] == 2*ry ? quarterfn-1 : quarterfn)
	let(finalizepos = togmod1__make_nd_vector_adder(pos))
[
	for(a=[0 : 1 : qfnx]) let(ang=      a*90/quarterfn) finalizepos([ size[0]/2-rx + rx*cos(ang),  size[1]/2-ry + ry*sin(ang)]),
	for(a=[0 : 1 : qfny]) let(ang= 90 + a*90/quarterfn) finalizepos([-size[0]/2+rx + rx*cos(ang),  size[1]/2-ry + ry*sin(ang)]),
	for(a=[0 : 1 : qfnx]) let(ang=180 + a*90/quarterfn) finalizepos([-size[0]/2+rx + rx*cos(ang), -size[1]/2+ry + ry*sin(ang)]),
	for(a=[0 : 1 : qfny]) let(ang=270 + a*90/quarterfn) finalizepos([ size[0]/2-rx + rx*cos(ang), -size[1]/2+ry + ry*sin(ang)]),
];

function togmod1_make_rect(size) =
	togmod1_make_polygon([
		[-size[0]/2, -size[1]/2],
		[+size[0]/2, -size[1]/2],
		[+size[0]/2, +size[1]/2],
		[-size[0]/2, +size[1]/2],
	]);

function togmod1_make_rounded_rect(size, r) =
	r == 0 ? togmod1_make_rect(size) :
	togmod1_make_polygon(togmod1_rounded_rect_points(size,r,simplify_rounded_sides=true));

/**
 * Returns points for an approximation of a circle where points are at distance r from pos.
 * Can be used to make other regular polygons, but the faces will be less than that
 * distance from pos (do some trig if you want face distance, e.g. for a hex nut).
 */
function togmod1_circle_points(r, pos=[0,0], d=undef) =
	assert( !is_undef(r) || !is_undef(d) )
	assert(!is_undef(pos[0]))
	assert(!is_undef(pos[1]))
	let(finalizepos = togmod1__make_nd_vector_adder(pos))
	let(r_ = !is_undef(r) ? r : d/2)
	let(fn = max($fn, 3))
	[for(i=[0 : 1 : fn-1]) finalizepos([r_*cos(i*360/fn), r_*sin(i*360/fn)])];

function togmod1_make_circle(r, pos=[0,0], d=undef) =
	r == 0 || d == 0 ? ["union"] :
	togmod1_make_polygon(togmod1_circle_points(r=r, pos=pos, d=d));

function togmod1_make_cylinder(d, zrange=[0,1], r=undef, pos=[0,0]) =
	assert( !is_undef(r) || !is_undef(d) )
	let( r_ = !is_undef(r) ? r : d/2 )
	// TODO: Make polyhedron directly
	["linear-extrude-zs", zrange, togmod1_make_circle(r=r_, pos=pos)];

function togmod1__is_range1d(range) = is_list(range) && len(range) == 2 && is_num(range[0]) && is_num(range[1]);

function togmod1_linear_extrude_z(range, shape) =
	assert(togmod1__is_range1d(range))
	["linear-extrude-zs", range, shape];
function togmod1_linear_extrude_x(range, shape) =
	assert(togmod1__is_range1d(range))
	["rotate", [90, 0, 90], togmod1_linear_extrude_z(range, shape)];
function togmod1_linear_extrude_y(range, shape) =
	assert(togmod1__is_range1d(range))
	["rotate", [90, 0,  0], togmod1_linear_extrude_z([-range[1], -range[0]], shape)];

function togmod1_text(text, size, font, halign, valign, spacing, direction, language, script) =
	["text-tsfhvsdls", text, size, font, halign, valign, spacing, direction, language, script];
// file: ../lib/TOGMod1.scad
// TOGMod1.9
// OpenSCAD library for representing shapes
// 
// See also: Functional OpenSCAD (https://github.com/thehans/FunctionalOpenSCAD)
// 
// v1.8:
// - Add `text-tsfhvsdls`
// v1.9
// - Add `offset-ds` (offset with _d_elta a _s_hape)

module togmod1_domodule(mod) {
	assert(is_list(mod));
	assert(len(mod) > 0);
	if( mod[0] == "polygon-vp" ) {
		// ["polygon-vp", vertexes, paths]
		polygon(points=mod[1], paths=mod[2]);
	} else if( mod[0] == "polyhedron-vf" ) {
		polyhedron(mod[1], faces=mod[2]);
	} else if( mod[0] == "scale" ) {
		assert(len(mod) == 3);
		scale(mod[1]) togmod1_domodule(mod[2]);
	} else if( mod[0] == "translate" ) {
		assert(len(mod) == 3);
		assert(is_list(mod[1]));
		for(c=mod[1]) assert(is_num(c), "translate component should be numeric");
		translate(mod[1]) togmod1_domodule(mod[2]);
	} else if( mod[0] == "rotate" ) {
		assert(len(mod) == 3);
		rotate(mod[1]) togmod1_domodule(mod[2]);
	} else if( mod[0] == "intersection" ) {
		intersection_for( i=[1:1:len(mod)-1] ) togmod1_domodule(mod[i]);
	} else if( mod[0] == "difference" ) {
		difference() {
			togmod1_domodule(mod[1]);
			for( i=[2:1:len(mod)-1] ) togmod1_domodule(mod[i]);
		}
	} else if( mod[0] == "union" ) {
		for( i=[1:1:len(mod)-1] ) togmod1_domodule(mod[i]);
	} else if( mod[0] == "hull" ) {
		hull() for( i=[1:1:len(mod)-1] ) togmod1_domodule(mod[i]);
	} else if( mod[0] == "offset-rs" ) {
		assert(len(mod) == 3);
		assert(is_num(mod[1]));
		assert(is_list(mod[2]));
		offset(mod[1]) togmod1_domodule(mod[2]);
	} else if( mod[0] == "linear-extrude-zs" ) {
		// ["linear-extrude-zs", [z0,z1], 2d_shape] // centered
		// ["linear-extrude-zs", height, 2d_shape]
		let( zrange = is_list(mod[1]) ? mod[1] : [-mod[1]/2, mod[1]/2] ) {
			translate([0,0,zrange[0]]) linear_extrude(zrange[1]-zrange[0]) togmod1_domodule(mod[2]);
		}
	} else if( mod[0] == "render" ) {
		render() togmod1_domodule(mod[1]);
	} else if( mod[0] == "minkowski" ) {
		minkowski() {
			togmod1_domodule(mod[1]);
			togmod1_domodule(mod[2]);
		}
	} else if( mod[0] == "x-debug" ) {
		# togmod1_domodule(mod[1]);
	} else if( mod[0] == "x-color" ) {
		color(mod[1]) togmod1_domodule(mod[2]);
	} else if( mod[0] == "text-tsfhvsdls" ) {
		text(text=mod[1], size=mod[2], font=mod[3], halign=mod[4], valign=mod[5], spacing=mod[6], direction=mod[7], language=mod[7], script=mod[8]);
	} else if( mod[0] == "offset-ds" ) {
		assert(is_num(mod[1]));
		assert(is_list(mod[2]));
		offset(delta=mod[1]) togmod1_domodule(mod[2]);
	} else {
		assert(false, str("Unrecognized shape: ", mod[0]));
	}
}
// main file
// PanelUConnector1.0
// 
// U-shaped connector for attaching
// one gridbeam panel (that fits inside the "U")
// perpendicular to another (that bolts under it)

base_thickness = "1/2inch";
wing_thickness = "1/2inch";
width = "1chunk";
total_height = "2inch";
length = "1chunk";
base_slot_diameter = "5/16inch";
base_slot_length = "0mm";
base_slot_frequency = 2;
wing_slot_diameter = "5/16inch";
wing_slot_frequency = 2;
$fn = 24;

module __paneluconnector__end_params() { }

// Not parameters:
// wing_slot_length = "0mm"; // Implied by total_height, yaddah yaddah

use <../lib/TOGMod1.scad>
use <../lib/TOGMod1Constructors.scad>
use <../lib/TOGPolyhedronLib1.scad>
use <../lib/TOGUnits1.scad>

chunk_mm              = togunits1_to_mm("chunk");
width_mm              = togunits1_to_mm(width);
length_mm             = togunits1_to_mm(length);
length_chunks         = togunits1_decode(length, unit="chunk");
total_height_mm       = togunits1_to_mm(total_height);
base_thickness_mm     = togunits1_to_mm(base_thickness);
base_slot_diameter_mm = togunits1_to_mm(base_slot_diameter);
base_slot_length_mm   = togunits1_to_mm(base_slot_length);
wing_thickness_mm     = togunits1_to_mm(wing_thickness);
wing_slot_diameter_mm = togunits1_to_mm(wing_slot_diameter);

togmod1_domodule(
	let( base_slot = tphl1_make_rounded_cuboid(
		[base_slot_length_mm+base_slot_diameter_mm, base_slot_diameter_mm, base_thickness_mm*3],
		r = let(r=base_slot_diameter_mm*127/256) [r,r,0]
	))
	let( wing_slot_z0 = base_thickness_mm + wing_slot_diameter_mm * 3/2 )
	let( wing_slot_z1 = total_height_mm   - wing_slot_diameter_mm * 3/2 )
	let( wing_slot = ["rotate", [90,0,0], ["translate", [0,(wing_slot_z0+wing_slot_z1)/2,0], tphl1_make_rounded_cuboid(
		[wing_slot_diameter_mm, wing_slot_z1-wing_slot_z0+wing_slot_diameter_mm, width_mm*2 + 2],
		r = let(r=wing_slot_diameter_mm*127/256) [r,r,0]
	)]])
	// TODO: Beveled counterbores for wing slots, 1/8" deep or so
	["difference",
		["translate", [0,0,total_height_mm/2],
			tphl1_make_rounded_cuboid(
				[length_mm, width_mm, total_height_mm],
				r=[5,5,3.175], corner_shape="cone2"
			)],
		
		// Cut out center.
		// Hmm: it'd be nice to round the edges somewhat.
		["translate", [0,0,total_height_mm],
			togmod1_make_cuboid(
				[length_mm+2, width_mm-wing_thickness_mm*2, (total_height_mm-base_thickness_mm)*2])],
		
		for( xm=[-length_chunks/2 + 0.5 : 1/base_slot_frequency : length_chunks/2-0.5] )
		["translate", [xm*chunk_mm,0,0], base_slot],
		
		for( xm=[-length_chunks/2 + 0.5 : 1/wing_slot_frequency : length_chunks/2-0.5] )
		["translate", [xm*chunk_mm,0,0], wing_slot],
		
		// TODO: 4.5m diamond holes in bottom for #6s on atom centers
	]
);
